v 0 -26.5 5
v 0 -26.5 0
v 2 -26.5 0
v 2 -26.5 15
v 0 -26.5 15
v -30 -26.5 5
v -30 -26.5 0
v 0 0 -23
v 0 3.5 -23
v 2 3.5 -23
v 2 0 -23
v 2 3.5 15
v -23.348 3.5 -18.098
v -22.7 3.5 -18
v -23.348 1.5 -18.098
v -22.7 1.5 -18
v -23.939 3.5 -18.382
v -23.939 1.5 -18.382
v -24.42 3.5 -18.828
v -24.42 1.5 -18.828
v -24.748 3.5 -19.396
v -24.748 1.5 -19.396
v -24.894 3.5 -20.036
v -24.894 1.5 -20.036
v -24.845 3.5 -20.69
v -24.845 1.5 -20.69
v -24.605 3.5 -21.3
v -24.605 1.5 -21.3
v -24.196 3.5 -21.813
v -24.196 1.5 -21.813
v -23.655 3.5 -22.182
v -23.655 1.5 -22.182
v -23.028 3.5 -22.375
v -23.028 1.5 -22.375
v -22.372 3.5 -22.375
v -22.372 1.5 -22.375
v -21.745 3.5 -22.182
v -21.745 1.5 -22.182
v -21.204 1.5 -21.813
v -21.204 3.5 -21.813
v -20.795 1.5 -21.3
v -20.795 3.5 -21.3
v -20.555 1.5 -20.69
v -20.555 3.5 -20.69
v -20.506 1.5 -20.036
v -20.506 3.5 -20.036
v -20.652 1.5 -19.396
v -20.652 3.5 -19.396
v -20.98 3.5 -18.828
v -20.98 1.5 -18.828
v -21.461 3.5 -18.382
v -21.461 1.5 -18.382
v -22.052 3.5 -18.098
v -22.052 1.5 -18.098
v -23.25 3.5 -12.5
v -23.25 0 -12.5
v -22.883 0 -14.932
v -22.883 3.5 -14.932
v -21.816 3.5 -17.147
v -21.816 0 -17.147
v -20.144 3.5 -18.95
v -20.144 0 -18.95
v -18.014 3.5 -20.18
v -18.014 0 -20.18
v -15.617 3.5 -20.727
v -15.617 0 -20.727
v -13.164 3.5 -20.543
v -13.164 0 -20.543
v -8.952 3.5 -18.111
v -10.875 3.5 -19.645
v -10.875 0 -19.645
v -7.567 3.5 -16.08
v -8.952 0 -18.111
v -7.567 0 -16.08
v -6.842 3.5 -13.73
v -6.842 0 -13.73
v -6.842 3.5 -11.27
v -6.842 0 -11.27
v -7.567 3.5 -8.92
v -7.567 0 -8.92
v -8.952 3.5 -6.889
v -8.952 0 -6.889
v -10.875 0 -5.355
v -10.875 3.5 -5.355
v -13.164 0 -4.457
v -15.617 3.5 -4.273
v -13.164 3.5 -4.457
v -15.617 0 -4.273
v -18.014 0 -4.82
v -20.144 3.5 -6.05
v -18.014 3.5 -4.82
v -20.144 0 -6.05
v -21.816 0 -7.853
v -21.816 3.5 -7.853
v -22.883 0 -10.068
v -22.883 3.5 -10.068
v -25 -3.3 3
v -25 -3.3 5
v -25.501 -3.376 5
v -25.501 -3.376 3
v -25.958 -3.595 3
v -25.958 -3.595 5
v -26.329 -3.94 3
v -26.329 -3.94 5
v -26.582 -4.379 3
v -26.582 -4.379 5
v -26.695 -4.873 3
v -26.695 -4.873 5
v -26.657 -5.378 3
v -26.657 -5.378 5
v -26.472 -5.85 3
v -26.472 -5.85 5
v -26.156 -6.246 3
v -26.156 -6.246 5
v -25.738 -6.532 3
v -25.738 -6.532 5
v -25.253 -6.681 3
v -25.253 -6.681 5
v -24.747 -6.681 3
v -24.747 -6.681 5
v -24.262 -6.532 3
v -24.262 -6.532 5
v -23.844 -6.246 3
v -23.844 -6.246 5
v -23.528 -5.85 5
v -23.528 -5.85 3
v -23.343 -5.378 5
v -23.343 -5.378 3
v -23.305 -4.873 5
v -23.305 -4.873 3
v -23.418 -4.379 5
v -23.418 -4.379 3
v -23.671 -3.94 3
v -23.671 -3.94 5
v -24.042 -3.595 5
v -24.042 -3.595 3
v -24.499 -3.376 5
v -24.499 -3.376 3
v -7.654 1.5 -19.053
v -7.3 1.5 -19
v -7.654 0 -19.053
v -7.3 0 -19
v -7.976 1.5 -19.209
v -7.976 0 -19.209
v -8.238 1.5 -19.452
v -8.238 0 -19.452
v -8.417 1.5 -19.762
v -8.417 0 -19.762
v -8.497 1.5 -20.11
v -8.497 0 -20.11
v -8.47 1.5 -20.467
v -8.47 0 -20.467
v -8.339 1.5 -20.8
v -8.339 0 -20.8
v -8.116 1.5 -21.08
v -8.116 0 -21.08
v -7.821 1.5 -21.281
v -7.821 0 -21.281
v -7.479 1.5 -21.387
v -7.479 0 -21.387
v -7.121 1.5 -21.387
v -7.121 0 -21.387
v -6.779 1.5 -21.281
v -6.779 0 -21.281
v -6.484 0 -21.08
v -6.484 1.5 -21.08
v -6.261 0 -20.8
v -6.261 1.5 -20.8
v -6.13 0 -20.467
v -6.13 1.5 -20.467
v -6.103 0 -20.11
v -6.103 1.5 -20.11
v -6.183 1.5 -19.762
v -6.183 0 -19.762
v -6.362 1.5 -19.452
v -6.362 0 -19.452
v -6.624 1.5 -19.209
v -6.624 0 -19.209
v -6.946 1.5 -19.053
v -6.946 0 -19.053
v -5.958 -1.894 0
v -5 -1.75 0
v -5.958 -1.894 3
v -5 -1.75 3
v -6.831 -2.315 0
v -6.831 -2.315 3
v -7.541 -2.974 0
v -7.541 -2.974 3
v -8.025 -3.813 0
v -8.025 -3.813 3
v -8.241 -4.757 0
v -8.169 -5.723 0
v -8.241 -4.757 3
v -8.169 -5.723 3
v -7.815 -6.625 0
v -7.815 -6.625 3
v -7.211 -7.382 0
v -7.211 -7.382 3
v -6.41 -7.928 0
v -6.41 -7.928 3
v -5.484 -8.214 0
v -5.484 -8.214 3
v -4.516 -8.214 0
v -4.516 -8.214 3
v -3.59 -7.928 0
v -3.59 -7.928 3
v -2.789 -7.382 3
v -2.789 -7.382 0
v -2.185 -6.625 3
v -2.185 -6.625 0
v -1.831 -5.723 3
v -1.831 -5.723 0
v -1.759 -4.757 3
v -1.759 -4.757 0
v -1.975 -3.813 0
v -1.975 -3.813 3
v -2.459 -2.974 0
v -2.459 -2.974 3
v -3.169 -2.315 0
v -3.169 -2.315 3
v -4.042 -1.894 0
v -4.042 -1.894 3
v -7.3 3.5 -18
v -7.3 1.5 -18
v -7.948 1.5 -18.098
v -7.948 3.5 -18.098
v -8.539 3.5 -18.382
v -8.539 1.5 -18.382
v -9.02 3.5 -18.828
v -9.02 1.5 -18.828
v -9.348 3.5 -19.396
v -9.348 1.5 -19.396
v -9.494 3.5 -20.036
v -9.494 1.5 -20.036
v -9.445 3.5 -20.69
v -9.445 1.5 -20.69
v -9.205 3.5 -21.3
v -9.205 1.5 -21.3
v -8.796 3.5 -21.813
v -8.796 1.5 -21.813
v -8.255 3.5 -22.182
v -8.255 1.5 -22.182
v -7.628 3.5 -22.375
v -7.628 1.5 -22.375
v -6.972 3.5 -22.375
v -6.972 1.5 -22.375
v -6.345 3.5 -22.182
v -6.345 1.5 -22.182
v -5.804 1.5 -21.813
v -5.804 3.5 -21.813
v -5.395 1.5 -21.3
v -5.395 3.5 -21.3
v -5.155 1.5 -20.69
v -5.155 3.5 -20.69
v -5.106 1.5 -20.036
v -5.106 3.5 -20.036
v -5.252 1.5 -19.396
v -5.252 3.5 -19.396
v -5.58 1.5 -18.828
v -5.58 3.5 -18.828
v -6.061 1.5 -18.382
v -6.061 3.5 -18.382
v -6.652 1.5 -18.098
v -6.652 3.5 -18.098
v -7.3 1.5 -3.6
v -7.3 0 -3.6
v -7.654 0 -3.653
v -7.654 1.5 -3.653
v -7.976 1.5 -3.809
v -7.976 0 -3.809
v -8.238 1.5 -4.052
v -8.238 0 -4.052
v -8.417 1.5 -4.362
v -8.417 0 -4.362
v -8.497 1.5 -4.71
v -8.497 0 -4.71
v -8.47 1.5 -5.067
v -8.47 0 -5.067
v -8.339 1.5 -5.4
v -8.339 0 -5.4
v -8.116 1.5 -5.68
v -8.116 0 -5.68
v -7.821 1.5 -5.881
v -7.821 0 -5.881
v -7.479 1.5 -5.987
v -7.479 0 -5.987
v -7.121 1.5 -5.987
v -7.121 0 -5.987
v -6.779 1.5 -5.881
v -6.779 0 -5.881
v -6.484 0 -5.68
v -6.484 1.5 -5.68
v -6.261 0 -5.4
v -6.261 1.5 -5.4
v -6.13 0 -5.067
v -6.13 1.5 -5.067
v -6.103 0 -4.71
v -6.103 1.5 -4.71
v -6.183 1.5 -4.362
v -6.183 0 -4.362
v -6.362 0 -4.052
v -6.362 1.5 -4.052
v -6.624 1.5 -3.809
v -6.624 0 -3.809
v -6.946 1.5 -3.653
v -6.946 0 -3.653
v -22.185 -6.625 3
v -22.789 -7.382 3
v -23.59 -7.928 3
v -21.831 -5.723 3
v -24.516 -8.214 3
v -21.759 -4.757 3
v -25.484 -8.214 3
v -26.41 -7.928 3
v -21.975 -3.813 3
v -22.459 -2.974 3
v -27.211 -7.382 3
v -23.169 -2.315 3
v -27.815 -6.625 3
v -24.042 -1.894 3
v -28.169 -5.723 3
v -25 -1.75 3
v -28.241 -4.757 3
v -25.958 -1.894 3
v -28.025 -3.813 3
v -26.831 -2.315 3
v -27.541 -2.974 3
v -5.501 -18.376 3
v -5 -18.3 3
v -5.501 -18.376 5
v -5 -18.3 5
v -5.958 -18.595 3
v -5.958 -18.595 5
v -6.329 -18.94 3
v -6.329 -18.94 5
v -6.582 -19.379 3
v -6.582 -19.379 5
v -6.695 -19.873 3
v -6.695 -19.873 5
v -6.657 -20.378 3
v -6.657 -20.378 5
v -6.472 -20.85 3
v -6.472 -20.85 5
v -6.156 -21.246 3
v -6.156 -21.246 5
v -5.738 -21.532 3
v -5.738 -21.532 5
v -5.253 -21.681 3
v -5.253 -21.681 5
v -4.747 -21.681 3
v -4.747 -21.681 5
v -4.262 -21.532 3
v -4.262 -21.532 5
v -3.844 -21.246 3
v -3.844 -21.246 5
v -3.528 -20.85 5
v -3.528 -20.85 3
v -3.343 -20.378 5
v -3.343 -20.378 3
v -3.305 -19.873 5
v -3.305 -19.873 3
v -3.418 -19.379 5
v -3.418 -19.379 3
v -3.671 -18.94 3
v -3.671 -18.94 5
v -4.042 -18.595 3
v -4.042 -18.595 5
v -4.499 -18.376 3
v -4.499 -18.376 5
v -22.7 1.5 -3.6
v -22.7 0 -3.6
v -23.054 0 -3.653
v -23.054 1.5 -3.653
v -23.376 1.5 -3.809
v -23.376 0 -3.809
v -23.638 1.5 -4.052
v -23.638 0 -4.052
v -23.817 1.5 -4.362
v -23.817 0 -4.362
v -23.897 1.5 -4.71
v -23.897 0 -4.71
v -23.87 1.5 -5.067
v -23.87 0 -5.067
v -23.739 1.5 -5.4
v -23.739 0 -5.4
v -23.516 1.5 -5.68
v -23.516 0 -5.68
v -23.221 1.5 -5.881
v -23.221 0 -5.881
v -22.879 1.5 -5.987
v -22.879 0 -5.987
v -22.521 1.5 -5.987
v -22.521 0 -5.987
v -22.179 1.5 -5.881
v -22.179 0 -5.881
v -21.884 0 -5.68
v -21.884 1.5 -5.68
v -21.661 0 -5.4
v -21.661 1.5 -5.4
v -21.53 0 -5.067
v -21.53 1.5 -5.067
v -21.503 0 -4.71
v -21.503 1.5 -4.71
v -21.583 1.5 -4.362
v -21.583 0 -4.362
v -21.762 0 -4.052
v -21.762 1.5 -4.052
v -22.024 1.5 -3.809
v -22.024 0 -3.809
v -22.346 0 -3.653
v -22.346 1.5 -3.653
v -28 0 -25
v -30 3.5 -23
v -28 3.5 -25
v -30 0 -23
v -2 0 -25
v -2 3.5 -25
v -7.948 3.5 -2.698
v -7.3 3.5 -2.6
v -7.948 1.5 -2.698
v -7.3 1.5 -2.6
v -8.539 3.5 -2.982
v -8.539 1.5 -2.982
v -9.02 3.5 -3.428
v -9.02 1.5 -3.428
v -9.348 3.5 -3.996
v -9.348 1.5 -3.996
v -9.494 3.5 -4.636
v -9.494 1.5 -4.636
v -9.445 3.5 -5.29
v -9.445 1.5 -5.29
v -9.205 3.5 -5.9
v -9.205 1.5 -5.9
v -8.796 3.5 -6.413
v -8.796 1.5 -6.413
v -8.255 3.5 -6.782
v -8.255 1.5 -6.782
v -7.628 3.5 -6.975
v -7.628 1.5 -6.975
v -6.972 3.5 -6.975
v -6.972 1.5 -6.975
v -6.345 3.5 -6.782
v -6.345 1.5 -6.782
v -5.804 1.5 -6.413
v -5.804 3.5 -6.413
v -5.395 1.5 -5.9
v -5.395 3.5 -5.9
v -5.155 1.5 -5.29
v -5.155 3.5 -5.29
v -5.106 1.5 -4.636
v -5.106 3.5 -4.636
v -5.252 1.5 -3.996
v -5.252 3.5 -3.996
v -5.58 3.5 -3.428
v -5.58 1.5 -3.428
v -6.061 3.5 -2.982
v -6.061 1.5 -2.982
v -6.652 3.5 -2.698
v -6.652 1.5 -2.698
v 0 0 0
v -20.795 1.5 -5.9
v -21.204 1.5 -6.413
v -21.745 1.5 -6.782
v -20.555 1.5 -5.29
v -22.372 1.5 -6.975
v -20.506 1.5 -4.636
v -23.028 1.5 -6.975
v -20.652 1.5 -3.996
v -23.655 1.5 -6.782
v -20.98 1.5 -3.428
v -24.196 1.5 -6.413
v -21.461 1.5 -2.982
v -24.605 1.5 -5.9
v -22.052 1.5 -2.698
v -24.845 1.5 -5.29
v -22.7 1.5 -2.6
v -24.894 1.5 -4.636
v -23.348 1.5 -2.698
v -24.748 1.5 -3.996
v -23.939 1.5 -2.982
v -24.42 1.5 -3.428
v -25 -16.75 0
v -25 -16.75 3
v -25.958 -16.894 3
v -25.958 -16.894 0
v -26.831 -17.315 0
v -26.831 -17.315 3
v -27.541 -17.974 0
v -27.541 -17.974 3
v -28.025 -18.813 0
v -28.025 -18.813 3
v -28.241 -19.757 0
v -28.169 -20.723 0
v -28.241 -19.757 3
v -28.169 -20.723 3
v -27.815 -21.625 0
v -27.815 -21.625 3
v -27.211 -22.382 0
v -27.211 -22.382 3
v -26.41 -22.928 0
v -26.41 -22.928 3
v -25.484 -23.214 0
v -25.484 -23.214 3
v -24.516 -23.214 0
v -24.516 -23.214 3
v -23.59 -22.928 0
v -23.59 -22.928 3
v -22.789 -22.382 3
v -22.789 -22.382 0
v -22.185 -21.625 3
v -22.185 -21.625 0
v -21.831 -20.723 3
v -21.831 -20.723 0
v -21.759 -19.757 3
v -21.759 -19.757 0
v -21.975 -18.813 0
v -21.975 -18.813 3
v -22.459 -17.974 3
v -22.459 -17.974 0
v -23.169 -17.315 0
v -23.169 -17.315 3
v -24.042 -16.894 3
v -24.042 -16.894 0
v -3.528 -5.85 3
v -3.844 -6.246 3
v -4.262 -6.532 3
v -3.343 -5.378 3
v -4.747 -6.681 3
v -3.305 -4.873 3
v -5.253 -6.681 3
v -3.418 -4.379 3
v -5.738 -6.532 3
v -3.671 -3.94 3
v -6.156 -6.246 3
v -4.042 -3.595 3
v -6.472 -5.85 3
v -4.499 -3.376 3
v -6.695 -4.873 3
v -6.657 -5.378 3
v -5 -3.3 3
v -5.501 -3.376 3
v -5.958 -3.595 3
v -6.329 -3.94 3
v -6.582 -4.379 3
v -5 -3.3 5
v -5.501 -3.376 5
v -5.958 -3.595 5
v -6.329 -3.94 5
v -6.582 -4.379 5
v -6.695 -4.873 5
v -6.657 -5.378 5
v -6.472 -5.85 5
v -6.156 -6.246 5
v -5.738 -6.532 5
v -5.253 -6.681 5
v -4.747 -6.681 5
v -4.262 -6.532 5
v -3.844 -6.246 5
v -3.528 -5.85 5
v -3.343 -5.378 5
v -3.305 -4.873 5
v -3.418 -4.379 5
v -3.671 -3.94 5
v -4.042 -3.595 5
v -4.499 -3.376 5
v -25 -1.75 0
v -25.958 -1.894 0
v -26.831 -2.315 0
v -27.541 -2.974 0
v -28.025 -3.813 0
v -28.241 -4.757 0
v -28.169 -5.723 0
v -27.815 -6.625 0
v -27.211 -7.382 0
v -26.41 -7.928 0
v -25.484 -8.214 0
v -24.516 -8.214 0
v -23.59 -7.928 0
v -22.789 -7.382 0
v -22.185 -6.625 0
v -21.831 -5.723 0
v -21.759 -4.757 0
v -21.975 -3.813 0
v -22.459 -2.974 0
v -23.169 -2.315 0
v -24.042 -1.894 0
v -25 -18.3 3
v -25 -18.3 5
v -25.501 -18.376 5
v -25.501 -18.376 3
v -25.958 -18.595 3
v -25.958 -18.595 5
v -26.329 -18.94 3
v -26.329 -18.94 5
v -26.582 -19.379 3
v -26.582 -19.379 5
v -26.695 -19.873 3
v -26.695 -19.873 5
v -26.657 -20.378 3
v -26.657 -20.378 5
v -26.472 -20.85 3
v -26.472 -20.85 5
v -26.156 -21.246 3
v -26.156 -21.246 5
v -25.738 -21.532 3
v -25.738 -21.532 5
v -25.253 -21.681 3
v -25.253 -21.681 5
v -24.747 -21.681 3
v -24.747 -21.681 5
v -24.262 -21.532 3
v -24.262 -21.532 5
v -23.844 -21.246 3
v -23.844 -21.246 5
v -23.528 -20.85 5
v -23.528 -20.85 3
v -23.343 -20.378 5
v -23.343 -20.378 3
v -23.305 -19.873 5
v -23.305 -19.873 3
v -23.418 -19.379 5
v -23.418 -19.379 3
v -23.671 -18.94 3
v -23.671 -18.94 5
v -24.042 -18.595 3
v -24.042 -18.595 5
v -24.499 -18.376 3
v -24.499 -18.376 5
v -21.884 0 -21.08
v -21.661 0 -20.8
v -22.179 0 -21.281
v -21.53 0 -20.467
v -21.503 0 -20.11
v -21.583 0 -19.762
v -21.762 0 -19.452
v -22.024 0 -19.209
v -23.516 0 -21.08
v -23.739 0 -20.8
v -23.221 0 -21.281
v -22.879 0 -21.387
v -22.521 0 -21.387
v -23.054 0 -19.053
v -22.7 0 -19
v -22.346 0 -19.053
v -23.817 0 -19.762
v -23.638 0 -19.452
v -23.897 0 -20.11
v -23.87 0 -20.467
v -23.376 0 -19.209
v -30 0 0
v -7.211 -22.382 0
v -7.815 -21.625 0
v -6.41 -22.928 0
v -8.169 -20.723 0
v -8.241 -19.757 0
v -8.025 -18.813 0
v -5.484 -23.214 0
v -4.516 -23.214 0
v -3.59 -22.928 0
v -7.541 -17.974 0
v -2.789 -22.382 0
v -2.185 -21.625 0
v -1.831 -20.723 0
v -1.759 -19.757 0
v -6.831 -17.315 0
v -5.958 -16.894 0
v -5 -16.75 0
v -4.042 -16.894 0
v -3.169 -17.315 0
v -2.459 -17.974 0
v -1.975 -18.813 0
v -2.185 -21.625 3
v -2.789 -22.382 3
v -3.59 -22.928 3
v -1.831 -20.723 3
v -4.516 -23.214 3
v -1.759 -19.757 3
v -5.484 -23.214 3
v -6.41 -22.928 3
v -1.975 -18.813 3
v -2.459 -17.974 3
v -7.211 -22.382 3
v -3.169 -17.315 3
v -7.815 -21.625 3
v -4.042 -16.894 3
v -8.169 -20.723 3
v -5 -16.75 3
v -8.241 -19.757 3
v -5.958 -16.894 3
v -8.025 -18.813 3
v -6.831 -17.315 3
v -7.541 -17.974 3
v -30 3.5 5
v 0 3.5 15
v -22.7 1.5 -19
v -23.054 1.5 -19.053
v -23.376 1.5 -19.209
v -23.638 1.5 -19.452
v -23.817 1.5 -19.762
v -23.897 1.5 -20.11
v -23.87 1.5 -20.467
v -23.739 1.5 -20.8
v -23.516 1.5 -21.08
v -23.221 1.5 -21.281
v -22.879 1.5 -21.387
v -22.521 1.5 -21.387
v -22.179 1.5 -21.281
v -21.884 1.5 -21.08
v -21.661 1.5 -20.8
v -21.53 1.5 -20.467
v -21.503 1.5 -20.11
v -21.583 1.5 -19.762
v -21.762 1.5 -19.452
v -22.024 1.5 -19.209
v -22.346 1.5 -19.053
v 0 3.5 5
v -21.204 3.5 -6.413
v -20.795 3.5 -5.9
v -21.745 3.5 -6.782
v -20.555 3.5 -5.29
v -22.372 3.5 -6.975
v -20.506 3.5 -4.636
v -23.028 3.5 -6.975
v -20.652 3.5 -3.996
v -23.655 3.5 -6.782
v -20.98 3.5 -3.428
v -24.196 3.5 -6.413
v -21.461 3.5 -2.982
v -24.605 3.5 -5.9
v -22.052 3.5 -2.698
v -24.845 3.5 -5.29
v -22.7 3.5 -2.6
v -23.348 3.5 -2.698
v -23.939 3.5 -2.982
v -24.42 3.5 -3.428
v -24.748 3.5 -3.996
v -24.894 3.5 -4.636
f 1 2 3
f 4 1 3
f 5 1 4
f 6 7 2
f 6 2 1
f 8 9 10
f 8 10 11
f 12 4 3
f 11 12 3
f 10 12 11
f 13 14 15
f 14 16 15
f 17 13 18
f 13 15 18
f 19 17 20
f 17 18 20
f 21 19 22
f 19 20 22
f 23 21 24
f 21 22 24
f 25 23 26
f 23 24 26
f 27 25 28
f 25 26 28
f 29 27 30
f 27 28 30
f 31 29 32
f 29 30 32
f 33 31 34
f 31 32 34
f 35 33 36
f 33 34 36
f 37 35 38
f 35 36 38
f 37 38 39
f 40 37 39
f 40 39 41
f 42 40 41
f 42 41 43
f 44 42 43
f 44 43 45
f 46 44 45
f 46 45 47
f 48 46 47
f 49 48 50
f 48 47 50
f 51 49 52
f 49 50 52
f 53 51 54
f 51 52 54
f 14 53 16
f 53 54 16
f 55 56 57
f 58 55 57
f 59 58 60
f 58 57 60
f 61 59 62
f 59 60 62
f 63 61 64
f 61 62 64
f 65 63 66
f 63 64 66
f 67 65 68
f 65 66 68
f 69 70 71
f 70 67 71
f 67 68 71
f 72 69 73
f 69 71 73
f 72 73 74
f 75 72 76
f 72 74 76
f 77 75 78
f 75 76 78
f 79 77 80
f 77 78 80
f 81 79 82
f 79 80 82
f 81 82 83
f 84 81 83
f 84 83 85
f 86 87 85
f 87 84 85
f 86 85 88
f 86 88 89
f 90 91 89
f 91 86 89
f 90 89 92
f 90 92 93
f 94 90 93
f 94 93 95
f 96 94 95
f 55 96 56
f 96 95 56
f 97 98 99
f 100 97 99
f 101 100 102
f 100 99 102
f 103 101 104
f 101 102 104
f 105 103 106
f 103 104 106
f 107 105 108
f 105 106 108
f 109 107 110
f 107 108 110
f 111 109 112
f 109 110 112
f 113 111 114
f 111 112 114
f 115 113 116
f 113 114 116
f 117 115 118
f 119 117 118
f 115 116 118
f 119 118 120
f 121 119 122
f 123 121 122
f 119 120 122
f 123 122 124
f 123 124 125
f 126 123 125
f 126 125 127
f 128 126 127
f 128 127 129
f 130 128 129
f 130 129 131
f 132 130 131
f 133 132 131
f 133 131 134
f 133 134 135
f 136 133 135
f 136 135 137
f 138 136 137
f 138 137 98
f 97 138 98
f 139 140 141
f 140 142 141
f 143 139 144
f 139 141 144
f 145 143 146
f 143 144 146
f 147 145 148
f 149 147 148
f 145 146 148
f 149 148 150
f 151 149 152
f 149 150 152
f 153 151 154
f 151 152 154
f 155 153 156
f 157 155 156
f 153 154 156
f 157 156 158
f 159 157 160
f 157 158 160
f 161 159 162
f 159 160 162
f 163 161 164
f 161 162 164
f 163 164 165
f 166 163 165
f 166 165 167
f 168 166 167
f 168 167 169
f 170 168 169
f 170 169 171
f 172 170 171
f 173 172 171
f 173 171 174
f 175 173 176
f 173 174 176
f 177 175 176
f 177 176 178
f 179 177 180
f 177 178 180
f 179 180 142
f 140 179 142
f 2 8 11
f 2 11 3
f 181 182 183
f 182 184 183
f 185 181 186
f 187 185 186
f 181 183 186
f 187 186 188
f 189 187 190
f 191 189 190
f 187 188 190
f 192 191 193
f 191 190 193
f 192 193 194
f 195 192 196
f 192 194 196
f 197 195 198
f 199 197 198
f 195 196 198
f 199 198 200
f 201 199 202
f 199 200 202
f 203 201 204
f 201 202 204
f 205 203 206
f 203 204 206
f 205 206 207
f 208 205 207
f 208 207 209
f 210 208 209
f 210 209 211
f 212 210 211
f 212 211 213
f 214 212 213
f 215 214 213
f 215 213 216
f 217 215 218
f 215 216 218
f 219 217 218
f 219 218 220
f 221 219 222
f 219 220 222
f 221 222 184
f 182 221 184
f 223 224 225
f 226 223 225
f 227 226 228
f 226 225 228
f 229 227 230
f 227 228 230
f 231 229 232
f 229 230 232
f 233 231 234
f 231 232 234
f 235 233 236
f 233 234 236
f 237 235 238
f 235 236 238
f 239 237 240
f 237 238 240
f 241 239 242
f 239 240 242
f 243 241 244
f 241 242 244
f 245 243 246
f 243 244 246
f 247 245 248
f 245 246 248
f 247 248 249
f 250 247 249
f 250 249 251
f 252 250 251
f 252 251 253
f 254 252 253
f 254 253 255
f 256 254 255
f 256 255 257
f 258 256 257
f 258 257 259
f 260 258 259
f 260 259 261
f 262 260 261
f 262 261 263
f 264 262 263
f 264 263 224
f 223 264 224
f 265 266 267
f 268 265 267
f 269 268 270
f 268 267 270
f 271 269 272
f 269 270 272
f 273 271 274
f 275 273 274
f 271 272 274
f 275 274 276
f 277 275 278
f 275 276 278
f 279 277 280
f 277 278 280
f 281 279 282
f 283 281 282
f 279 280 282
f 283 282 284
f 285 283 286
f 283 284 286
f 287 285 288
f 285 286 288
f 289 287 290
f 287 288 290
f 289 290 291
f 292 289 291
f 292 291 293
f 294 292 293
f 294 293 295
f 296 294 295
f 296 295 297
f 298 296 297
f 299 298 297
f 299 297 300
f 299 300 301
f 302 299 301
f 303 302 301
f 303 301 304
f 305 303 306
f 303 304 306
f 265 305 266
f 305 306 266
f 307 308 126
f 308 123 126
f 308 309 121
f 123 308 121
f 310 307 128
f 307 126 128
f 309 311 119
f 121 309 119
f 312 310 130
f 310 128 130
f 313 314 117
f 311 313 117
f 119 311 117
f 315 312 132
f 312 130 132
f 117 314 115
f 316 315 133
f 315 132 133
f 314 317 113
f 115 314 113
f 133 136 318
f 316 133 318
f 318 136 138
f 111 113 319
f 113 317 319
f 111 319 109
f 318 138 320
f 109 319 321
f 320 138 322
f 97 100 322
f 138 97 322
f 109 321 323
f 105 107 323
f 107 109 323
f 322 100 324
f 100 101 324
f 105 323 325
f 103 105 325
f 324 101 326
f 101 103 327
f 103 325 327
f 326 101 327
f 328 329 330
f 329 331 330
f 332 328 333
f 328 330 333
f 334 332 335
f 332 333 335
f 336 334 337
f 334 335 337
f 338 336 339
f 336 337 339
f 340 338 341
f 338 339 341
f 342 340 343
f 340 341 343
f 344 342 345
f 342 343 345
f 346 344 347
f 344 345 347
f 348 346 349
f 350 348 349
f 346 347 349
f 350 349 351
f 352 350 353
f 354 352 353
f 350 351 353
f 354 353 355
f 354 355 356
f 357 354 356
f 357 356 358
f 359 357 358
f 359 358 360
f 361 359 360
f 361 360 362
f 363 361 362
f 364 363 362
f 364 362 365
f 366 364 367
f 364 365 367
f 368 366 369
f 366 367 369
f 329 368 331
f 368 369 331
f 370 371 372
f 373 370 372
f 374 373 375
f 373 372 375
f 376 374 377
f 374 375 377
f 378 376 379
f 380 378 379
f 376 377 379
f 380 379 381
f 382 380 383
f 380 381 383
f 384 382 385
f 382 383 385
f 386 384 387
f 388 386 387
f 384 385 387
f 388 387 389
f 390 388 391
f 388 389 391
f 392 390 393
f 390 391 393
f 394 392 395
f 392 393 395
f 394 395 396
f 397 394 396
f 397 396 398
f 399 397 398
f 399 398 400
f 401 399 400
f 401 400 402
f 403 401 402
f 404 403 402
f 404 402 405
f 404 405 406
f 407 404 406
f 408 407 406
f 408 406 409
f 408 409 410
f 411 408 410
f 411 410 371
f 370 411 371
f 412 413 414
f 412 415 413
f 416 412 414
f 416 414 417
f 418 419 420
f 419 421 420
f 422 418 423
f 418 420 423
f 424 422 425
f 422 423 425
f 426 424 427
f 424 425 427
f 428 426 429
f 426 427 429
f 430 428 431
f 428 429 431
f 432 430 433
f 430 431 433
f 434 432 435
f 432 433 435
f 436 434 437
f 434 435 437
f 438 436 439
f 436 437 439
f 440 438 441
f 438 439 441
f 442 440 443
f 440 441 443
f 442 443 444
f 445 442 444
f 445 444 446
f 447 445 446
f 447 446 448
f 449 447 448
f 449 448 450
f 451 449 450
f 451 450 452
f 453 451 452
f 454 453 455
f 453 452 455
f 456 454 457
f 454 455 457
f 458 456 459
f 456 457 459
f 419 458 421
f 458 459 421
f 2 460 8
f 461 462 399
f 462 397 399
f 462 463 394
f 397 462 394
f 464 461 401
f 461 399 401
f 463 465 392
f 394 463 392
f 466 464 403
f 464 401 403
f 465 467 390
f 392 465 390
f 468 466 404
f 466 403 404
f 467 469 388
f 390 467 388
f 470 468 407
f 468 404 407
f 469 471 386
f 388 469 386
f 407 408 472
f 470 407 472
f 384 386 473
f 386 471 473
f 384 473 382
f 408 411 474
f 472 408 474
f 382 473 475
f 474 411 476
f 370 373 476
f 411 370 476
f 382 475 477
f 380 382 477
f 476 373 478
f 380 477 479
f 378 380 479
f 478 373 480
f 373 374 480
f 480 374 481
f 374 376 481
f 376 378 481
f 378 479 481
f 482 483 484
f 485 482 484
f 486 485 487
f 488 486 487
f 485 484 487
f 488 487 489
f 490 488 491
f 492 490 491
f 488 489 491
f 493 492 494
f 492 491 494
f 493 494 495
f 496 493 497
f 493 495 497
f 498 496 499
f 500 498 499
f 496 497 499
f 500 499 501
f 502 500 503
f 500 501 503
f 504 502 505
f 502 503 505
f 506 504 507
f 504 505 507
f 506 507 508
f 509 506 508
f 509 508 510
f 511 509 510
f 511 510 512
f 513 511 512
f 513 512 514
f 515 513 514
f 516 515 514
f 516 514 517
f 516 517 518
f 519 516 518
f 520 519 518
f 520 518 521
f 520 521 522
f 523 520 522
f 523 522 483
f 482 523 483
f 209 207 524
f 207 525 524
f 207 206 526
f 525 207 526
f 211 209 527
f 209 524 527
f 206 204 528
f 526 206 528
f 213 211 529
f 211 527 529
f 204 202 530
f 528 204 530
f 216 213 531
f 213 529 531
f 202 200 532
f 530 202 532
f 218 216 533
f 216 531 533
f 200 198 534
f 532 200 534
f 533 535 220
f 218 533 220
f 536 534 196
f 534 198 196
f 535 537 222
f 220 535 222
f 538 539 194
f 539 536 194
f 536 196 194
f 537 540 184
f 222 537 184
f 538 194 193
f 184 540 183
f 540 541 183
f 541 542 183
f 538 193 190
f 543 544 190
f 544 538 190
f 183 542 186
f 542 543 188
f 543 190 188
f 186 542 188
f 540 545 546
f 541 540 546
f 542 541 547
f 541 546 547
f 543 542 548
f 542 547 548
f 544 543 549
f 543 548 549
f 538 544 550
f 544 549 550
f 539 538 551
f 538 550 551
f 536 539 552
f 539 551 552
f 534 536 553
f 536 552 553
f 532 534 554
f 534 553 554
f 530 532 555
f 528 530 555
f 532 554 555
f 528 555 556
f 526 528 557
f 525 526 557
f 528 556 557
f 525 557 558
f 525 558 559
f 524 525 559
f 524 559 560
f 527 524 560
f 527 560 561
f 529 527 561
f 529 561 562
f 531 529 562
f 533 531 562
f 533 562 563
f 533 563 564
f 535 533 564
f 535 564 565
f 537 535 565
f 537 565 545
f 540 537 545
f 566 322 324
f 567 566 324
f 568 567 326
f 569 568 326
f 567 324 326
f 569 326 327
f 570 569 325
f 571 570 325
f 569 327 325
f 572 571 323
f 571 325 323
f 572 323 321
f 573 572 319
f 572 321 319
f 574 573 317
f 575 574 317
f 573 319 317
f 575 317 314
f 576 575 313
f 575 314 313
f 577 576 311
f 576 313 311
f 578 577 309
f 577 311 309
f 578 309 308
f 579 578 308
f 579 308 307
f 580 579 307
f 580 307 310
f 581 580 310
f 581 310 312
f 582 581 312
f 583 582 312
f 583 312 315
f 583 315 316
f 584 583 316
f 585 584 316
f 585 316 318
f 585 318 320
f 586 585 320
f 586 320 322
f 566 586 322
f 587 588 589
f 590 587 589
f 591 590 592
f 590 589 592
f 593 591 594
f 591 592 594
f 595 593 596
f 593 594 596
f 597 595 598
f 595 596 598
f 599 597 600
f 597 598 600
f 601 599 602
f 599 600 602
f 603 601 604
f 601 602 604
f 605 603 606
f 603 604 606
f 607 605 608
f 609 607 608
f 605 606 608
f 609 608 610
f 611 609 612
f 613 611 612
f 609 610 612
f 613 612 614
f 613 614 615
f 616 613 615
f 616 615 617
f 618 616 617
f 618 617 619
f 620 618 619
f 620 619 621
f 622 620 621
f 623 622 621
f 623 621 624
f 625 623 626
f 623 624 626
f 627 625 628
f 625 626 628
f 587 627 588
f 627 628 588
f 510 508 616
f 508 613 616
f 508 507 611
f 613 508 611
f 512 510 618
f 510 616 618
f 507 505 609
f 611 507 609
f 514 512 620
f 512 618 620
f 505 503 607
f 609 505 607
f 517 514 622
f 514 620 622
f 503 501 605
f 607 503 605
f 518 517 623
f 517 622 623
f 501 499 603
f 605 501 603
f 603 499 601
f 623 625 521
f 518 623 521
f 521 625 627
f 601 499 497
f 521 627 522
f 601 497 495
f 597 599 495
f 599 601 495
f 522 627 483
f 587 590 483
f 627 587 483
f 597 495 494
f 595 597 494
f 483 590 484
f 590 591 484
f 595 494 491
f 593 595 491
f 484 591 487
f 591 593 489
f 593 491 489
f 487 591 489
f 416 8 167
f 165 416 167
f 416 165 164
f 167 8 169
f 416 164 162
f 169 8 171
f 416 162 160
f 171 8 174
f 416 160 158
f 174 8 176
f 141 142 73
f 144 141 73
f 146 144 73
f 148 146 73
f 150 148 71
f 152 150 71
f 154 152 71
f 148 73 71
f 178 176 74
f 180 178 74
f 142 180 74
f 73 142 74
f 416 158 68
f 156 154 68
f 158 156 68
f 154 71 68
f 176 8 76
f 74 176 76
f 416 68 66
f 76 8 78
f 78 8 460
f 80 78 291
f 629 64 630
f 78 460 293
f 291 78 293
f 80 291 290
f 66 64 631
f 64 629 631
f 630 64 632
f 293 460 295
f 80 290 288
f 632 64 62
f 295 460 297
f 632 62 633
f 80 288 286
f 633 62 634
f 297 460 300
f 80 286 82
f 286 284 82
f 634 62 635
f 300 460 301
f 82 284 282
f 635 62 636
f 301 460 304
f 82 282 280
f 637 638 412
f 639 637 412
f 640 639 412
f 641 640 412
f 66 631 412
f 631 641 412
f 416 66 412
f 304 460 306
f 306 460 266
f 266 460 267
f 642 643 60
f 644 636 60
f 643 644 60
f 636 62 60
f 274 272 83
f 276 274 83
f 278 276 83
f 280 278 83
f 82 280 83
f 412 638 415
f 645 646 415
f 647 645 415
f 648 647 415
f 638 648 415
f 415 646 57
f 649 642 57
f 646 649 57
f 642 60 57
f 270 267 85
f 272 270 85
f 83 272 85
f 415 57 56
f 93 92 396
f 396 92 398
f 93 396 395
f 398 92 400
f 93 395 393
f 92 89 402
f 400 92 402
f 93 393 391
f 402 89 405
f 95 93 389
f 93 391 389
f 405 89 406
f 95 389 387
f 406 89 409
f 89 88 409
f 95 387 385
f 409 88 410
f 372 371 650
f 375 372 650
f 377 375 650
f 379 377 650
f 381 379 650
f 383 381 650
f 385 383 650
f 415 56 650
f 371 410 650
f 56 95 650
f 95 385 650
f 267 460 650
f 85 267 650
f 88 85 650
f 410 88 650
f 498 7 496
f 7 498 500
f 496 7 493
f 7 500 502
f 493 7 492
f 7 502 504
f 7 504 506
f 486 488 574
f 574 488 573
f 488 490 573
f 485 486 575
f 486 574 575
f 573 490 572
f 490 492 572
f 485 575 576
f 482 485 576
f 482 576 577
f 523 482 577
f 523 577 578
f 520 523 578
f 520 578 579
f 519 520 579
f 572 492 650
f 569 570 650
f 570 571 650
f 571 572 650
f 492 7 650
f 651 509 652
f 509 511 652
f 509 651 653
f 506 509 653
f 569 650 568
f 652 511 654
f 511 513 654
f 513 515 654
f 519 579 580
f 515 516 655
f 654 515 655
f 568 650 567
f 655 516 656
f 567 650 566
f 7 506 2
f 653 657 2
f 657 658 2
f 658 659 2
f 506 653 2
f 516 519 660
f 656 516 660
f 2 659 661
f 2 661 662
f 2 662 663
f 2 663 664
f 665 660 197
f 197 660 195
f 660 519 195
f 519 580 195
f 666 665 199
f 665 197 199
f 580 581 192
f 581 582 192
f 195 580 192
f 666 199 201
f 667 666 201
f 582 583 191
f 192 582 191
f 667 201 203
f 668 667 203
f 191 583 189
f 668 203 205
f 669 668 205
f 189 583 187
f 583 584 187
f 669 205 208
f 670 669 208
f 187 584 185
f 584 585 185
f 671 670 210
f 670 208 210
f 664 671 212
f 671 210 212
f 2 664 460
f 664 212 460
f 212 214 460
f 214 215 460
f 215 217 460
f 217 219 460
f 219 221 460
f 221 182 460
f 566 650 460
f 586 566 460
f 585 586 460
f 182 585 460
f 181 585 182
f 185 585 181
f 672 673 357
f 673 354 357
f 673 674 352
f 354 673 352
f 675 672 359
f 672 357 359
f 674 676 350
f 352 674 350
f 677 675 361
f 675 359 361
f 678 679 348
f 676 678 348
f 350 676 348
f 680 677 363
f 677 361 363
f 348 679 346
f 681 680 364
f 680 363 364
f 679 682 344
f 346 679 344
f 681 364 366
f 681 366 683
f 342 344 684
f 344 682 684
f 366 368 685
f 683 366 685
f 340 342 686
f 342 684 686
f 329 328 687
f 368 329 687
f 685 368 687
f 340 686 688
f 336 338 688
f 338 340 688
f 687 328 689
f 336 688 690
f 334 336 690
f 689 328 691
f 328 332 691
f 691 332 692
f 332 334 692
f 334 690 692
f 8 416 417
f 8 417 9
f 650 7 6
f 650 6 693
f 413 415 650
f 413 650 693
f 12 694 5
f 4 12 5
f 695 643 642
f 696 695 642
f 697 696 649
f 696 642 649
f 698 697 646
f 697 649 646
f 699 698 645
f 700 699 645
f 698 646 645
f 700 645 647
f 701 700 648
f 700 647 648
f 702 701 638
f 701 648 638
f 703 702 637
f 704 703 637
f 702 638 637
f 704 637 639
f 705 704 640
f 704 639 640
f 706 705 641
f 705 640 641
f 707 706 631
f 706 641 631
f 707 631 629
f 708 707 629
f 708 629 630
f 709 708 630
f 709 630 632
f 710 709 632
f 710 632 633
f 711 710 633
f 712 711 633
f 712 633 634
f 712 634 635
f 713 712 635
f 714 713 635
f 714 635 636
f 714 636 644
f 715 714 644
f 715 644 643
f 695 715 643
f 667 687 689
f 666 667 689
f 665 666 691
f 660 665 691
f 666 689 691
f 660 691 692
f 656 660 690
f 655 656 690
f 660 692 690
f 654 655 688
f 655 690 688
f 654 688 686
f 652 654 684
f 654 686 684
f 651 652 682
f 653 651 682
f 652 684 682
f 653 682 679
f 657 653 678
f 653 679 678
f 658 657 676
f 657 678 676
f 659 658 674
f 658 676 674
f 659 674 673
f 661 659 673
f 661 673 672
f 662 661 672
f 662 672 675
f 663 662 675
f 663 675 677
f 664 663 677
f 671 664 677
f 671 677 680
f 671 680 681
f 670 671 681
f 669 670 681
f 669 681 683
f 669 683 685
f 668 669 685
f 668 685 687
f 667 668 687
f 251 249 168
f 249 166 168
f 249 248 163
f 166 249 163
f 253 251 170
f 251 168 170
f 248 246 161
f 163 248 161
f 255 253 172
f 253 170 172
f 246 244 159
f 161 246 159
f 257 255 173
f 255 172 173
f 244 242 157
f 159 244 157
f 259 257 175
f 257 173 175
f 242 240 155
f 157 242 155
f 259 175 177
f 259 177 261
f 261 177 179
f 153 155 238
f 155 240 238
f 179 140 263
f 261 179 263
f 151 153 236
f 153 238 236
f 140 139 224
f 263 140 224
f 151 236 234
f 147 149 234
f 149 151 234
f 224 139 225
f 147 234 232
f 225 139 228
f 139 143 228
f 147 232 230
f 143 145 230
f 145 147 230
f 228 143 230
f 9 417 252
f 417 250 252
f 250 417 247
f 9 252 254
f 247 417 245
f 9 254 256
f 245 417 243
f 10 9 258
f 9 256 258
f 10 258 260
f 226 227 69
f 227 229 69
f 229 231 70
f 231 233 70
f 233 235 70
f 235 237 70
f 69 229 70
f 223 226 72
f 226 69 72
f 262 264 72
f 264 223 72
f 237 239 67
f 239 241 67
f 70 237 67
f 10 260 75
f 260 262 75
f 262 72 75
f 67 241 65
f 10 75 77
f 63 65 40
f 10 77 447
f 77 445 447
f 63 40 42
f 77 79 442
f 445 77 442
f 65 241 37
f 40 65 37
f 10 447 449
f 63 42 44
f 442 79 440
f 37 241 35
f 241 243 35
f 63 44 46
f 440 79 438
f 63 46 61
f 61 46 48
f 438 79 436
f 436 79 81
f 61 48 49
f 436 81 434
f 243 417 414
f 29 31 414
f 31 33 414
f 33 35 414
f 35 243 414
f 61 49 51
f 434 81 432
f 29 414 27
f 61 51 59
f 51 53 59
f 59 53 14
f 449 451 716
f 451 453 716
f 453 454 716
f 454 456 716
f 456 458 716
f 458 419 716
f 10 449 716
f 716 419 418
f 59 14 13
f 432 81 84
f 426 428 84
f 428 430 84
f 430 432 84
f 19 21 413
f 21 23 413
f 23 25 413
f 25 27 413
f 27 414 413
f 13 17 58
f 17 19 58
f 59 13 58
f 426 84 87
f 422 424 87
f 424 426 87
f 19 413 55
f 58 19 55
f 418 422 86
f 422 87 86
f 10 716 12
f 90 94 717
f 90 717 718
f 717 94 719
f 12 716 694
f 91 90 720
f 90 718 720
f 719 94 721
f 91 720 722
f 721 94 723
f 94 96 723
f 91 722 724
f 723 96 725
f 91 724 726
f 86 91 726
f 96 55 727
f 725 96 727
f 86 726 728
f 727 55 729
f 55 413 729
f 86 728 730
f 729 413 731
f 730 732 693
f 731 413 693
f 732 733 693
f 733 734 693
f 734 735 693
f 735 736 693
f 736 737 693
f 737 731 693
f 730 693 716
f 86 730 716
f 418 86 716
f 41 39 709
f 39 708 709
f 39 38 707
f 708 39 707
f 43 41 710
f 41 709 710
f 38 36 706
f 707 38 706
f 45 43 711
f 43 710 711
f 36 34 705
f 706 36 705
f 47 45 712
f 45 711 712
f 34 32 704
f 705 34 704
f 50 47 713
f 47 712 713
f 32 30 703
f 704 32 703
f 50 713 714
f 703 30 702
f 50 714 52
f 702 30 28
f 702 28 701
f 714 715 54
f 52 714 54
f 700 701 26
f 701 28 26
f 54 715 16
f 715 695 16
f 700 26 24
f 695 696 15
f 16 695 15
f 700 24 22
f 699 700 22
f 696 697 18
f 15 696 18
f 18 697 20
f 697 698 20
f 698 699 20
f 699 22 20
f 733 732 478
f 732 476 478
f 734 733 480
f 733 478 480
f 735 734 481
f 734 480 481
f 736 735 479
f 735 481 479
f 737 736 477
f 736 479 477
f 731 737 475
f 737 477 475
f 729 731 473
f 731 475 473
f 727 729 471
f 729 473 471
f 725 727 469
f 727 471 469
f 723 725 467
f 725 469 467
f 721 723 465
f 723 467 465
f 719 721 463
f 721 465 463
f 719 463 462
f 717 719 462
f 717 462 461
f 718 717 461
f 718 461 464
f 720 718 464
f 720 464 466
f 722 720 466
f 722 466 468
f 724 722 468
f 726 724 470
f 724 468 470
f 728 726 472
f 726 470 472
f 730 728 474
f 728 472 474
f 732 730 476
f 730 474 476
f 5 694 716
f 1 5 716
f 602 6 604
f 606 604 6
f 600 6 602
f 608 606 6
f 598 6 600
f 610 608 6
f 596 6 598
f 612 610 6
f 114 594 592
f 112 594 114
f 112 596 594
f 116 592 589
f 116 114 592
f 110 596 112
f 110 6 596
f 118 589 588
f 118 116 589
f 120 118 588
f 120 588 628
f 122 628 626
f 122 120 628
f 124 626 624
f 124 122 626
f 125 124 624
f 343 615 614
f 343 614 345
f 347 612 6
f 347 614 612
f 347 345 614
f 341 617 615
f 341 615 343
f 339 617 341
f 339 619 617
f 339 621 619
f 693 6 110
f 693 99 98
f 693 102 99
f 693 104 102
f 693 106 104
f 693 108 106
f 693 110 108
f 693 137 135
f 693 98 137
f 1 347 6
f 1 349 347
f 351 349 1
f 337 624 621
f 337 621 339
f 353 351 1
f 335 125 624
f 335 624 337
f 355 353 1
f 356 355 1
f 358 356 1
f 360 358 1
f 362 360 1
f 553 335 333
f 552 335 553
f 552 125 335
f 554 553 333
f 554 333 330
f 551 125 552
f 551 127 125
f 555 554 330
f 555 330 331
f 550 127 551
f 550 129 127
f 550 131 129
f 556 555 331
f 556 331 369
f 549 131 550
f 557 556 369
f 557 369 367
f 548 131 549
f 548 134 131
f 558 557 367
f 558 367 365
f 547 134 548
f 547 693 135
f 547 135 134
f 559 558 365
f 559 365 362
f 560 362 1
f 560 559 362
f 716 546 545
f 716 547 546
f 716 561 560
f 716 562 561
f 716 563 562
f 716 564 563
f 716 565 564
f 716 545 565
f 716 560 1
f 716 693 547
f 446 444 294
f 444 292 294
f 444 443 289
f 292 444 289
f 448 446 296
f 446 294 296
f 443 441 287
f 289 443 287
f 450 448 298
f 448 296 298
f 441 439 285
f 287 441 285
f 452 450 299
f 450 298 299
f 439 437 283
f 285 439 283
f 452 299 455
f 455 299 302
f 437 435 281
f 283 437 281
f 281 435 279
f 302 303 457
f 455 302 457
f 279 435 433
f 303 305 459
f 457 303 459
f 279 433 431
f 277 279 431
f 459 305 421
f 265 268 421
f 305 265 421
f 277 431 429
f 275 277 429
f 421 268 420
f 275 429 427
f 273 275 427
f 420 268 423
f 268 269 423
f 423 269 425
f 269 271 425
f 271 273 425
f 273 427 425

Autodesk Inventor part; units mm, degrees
ref_plane "YZ Plane" through (0, 0, 0) normal (1, 0, 0) x (0, 1, 0)
ref_plane "XZ Plane" through (0, 0, 0) normal (0, 1, 0) x (-1, 0, 0)
ref_plane "XY Plane" through (0, 0, 0) normal (0, 0, 1) x (1, 0, 0)
sketch "Esquisse1" plane through (0, 0, 0) normal (0, 1, 0) x (-1, 0, 0)
  line L0 (0, 0) -> (30, 0)
  line L1 (30, 0) -> (30, -23)
  line L2 (28, -25) -> (2, -25)
  line L3 (0, -23) -> (0, 0)
  circle A0 centre (15, -12.5) radius 8.25
  line L4 (30, -23) -> (28, -25)
  line L5 (2, -25) -> (0, -23)
  point P0 (0, 0)
  point P1 (30, -25)
  point P2 (0, -25)
  point P3 (11.5, 0)
  point P4 (30, -4)
  point P5 (21, 0)
  point P6 (0, -2)
  point P7 (2, 0)
  dimension "d0" = 25
  dimension "d1" = 30
  dimension "d2" = 16.5
  dimension "d3" = 15
  dimension "d11" = 2
  dimension "d12" = 2
  dimension "d13" = 2
  dimension "d14" = 2
  dimension "d47" = 12.5
extrude "Extrusion1" add sketch "Esquisse1" along normal blind 3.5
sketch "Esquisse2" plane through (0, 3.5, 0) normal (0, 1, 0) x (1, 0, 0)
  circle A0 centre (-15, 12.5) radius 8.25 construction
  circle A1 centre (-15, 12.5) radius 10.8894 construction
  line L0 (-22.7, 4.8) -> (-22.7, 20.2) construction
  line L1 (-22.7, 20.2) -> (-7.3, 20.2) construction
  line L2 (-7.3, 20.2) -> (-7.3, 4.8) construction
  line L3 (-7.3, 4.8) -> (-22.7, 4.8) construction
  point P0 (0, 0)
  dimension "d19" = 15.4
  dimension "d20" = 15.4
hole "Perçage1" at (-22.7, 3.5, -4.8) at (-22.7, 3.5, -20.2) at (-7.3, 3.5, -20.2) at (-7.3, 3.5, -4.8) direction (0, -1, 0) diameter 2.4 end through all counterbore diameter 4.4 counterbore depth 2 clearance for "Vis d'assemblage à six pans creux" size "M2" standard "Profil M métrique ANSI"
sketch "Esquisse3" plane through (-30, 0, 0) normal (0, 0, 1) x (1, 0, 0)
  line L0 (0, 3.5) -> (30, 3.5) projected
  line L1 (0, 3.5) -> (30, 3.5)
  line L2 (30, 3.5) -> (30, -26.5)
  line L3 (30, -26.5) -> (0, -26.5)
  line L4 (0, -26.5) -> (0, 3.5)
  point P0 (30, 0)
  point P1 (30, 3.5)
  dimension "d29" = 30
  dimension "d48" = 30
  dimension "d49" = 30
extrude "Extrusion2" add sketch "Esquisse3" along normal blind 5
sketch "Esquisse5" plane through (-30, 0, 0) normal (0, 0, -1) x (-1, 0, 0)
  line L0 (-5, -5) -> (-25, -5) construction
  line L1 (-25, -5) -> (-25, -20) construction
  line L2 (-25, -20) -> (-5, -20) construction
  line L3 (-5, -20) -> (-5, -5) construction
  line L4 (-28, 0) -> (-2, 0) construction
  line L5 (0, 0) -> (0, -23) construction
  point P0 (-30, 0)
  point P1 (0, -21)
  dimension "d36" = 15
  dimension "d37" = 20
  dimension "d38" = 5
  dimension "d39" = 5
hole "Perçage2" at (-25, -5, 0) at (-25, -20, 0) at (-5, -20, 0) at (-5, -5, 0) direction (0, 0, 1) diameter 3.4 end through all counterbore diameter 6.5 counterbore depth 3 clearance for "Vis d'assemblage à six pans creux" size "M3" standard "Profil M métrique ANSI"
sketch "Esquisse6" plane through (0, 0, -23) normal (1, 0, 0) x (0, 0, -1)
  line L0 (0, 3.5) -> (-28, 3.5) projected
  line L1 (-28, 3.5) -> (-38, 3.5)
  line L2 (-38, 3.5) -> (-38, -26.5)
  line L3 (-38, -26.5) -> (-28, -26.5)
  line L4 (-28, 3.5) -> (0, 3.5)
  line L5 (0, 3.5) -> (0, 0)
  line L6 (-23, -26.5) -> (-23, 0) projected
  line L7 (0, 0) -> (-23, -26.5)
  line L8 (-23, -26.5) -> (-28.3834, -26.5)
  dimension "d53" = 30
  dimension "d54" = 10
  dimension "d55" = 10
extrude "Extrusion4" add sketch "Esquisse6" along normal blind 2
equation "\"d3\" = 0.5 * d1"
equation "\"d11\" = d9"
equation "\"d12\" = d11"
equation "\"d13\" = d9"
equation "\"d14\" = d13"
equation "\"d47\" = 0.5 * d0"
equation "\"d20\" = d19"
equation "\"d48\" = d49"
equation "\"d55\" = d54"
equation "\"d9\" = 2"
properties part number "support nema8_gauche"
